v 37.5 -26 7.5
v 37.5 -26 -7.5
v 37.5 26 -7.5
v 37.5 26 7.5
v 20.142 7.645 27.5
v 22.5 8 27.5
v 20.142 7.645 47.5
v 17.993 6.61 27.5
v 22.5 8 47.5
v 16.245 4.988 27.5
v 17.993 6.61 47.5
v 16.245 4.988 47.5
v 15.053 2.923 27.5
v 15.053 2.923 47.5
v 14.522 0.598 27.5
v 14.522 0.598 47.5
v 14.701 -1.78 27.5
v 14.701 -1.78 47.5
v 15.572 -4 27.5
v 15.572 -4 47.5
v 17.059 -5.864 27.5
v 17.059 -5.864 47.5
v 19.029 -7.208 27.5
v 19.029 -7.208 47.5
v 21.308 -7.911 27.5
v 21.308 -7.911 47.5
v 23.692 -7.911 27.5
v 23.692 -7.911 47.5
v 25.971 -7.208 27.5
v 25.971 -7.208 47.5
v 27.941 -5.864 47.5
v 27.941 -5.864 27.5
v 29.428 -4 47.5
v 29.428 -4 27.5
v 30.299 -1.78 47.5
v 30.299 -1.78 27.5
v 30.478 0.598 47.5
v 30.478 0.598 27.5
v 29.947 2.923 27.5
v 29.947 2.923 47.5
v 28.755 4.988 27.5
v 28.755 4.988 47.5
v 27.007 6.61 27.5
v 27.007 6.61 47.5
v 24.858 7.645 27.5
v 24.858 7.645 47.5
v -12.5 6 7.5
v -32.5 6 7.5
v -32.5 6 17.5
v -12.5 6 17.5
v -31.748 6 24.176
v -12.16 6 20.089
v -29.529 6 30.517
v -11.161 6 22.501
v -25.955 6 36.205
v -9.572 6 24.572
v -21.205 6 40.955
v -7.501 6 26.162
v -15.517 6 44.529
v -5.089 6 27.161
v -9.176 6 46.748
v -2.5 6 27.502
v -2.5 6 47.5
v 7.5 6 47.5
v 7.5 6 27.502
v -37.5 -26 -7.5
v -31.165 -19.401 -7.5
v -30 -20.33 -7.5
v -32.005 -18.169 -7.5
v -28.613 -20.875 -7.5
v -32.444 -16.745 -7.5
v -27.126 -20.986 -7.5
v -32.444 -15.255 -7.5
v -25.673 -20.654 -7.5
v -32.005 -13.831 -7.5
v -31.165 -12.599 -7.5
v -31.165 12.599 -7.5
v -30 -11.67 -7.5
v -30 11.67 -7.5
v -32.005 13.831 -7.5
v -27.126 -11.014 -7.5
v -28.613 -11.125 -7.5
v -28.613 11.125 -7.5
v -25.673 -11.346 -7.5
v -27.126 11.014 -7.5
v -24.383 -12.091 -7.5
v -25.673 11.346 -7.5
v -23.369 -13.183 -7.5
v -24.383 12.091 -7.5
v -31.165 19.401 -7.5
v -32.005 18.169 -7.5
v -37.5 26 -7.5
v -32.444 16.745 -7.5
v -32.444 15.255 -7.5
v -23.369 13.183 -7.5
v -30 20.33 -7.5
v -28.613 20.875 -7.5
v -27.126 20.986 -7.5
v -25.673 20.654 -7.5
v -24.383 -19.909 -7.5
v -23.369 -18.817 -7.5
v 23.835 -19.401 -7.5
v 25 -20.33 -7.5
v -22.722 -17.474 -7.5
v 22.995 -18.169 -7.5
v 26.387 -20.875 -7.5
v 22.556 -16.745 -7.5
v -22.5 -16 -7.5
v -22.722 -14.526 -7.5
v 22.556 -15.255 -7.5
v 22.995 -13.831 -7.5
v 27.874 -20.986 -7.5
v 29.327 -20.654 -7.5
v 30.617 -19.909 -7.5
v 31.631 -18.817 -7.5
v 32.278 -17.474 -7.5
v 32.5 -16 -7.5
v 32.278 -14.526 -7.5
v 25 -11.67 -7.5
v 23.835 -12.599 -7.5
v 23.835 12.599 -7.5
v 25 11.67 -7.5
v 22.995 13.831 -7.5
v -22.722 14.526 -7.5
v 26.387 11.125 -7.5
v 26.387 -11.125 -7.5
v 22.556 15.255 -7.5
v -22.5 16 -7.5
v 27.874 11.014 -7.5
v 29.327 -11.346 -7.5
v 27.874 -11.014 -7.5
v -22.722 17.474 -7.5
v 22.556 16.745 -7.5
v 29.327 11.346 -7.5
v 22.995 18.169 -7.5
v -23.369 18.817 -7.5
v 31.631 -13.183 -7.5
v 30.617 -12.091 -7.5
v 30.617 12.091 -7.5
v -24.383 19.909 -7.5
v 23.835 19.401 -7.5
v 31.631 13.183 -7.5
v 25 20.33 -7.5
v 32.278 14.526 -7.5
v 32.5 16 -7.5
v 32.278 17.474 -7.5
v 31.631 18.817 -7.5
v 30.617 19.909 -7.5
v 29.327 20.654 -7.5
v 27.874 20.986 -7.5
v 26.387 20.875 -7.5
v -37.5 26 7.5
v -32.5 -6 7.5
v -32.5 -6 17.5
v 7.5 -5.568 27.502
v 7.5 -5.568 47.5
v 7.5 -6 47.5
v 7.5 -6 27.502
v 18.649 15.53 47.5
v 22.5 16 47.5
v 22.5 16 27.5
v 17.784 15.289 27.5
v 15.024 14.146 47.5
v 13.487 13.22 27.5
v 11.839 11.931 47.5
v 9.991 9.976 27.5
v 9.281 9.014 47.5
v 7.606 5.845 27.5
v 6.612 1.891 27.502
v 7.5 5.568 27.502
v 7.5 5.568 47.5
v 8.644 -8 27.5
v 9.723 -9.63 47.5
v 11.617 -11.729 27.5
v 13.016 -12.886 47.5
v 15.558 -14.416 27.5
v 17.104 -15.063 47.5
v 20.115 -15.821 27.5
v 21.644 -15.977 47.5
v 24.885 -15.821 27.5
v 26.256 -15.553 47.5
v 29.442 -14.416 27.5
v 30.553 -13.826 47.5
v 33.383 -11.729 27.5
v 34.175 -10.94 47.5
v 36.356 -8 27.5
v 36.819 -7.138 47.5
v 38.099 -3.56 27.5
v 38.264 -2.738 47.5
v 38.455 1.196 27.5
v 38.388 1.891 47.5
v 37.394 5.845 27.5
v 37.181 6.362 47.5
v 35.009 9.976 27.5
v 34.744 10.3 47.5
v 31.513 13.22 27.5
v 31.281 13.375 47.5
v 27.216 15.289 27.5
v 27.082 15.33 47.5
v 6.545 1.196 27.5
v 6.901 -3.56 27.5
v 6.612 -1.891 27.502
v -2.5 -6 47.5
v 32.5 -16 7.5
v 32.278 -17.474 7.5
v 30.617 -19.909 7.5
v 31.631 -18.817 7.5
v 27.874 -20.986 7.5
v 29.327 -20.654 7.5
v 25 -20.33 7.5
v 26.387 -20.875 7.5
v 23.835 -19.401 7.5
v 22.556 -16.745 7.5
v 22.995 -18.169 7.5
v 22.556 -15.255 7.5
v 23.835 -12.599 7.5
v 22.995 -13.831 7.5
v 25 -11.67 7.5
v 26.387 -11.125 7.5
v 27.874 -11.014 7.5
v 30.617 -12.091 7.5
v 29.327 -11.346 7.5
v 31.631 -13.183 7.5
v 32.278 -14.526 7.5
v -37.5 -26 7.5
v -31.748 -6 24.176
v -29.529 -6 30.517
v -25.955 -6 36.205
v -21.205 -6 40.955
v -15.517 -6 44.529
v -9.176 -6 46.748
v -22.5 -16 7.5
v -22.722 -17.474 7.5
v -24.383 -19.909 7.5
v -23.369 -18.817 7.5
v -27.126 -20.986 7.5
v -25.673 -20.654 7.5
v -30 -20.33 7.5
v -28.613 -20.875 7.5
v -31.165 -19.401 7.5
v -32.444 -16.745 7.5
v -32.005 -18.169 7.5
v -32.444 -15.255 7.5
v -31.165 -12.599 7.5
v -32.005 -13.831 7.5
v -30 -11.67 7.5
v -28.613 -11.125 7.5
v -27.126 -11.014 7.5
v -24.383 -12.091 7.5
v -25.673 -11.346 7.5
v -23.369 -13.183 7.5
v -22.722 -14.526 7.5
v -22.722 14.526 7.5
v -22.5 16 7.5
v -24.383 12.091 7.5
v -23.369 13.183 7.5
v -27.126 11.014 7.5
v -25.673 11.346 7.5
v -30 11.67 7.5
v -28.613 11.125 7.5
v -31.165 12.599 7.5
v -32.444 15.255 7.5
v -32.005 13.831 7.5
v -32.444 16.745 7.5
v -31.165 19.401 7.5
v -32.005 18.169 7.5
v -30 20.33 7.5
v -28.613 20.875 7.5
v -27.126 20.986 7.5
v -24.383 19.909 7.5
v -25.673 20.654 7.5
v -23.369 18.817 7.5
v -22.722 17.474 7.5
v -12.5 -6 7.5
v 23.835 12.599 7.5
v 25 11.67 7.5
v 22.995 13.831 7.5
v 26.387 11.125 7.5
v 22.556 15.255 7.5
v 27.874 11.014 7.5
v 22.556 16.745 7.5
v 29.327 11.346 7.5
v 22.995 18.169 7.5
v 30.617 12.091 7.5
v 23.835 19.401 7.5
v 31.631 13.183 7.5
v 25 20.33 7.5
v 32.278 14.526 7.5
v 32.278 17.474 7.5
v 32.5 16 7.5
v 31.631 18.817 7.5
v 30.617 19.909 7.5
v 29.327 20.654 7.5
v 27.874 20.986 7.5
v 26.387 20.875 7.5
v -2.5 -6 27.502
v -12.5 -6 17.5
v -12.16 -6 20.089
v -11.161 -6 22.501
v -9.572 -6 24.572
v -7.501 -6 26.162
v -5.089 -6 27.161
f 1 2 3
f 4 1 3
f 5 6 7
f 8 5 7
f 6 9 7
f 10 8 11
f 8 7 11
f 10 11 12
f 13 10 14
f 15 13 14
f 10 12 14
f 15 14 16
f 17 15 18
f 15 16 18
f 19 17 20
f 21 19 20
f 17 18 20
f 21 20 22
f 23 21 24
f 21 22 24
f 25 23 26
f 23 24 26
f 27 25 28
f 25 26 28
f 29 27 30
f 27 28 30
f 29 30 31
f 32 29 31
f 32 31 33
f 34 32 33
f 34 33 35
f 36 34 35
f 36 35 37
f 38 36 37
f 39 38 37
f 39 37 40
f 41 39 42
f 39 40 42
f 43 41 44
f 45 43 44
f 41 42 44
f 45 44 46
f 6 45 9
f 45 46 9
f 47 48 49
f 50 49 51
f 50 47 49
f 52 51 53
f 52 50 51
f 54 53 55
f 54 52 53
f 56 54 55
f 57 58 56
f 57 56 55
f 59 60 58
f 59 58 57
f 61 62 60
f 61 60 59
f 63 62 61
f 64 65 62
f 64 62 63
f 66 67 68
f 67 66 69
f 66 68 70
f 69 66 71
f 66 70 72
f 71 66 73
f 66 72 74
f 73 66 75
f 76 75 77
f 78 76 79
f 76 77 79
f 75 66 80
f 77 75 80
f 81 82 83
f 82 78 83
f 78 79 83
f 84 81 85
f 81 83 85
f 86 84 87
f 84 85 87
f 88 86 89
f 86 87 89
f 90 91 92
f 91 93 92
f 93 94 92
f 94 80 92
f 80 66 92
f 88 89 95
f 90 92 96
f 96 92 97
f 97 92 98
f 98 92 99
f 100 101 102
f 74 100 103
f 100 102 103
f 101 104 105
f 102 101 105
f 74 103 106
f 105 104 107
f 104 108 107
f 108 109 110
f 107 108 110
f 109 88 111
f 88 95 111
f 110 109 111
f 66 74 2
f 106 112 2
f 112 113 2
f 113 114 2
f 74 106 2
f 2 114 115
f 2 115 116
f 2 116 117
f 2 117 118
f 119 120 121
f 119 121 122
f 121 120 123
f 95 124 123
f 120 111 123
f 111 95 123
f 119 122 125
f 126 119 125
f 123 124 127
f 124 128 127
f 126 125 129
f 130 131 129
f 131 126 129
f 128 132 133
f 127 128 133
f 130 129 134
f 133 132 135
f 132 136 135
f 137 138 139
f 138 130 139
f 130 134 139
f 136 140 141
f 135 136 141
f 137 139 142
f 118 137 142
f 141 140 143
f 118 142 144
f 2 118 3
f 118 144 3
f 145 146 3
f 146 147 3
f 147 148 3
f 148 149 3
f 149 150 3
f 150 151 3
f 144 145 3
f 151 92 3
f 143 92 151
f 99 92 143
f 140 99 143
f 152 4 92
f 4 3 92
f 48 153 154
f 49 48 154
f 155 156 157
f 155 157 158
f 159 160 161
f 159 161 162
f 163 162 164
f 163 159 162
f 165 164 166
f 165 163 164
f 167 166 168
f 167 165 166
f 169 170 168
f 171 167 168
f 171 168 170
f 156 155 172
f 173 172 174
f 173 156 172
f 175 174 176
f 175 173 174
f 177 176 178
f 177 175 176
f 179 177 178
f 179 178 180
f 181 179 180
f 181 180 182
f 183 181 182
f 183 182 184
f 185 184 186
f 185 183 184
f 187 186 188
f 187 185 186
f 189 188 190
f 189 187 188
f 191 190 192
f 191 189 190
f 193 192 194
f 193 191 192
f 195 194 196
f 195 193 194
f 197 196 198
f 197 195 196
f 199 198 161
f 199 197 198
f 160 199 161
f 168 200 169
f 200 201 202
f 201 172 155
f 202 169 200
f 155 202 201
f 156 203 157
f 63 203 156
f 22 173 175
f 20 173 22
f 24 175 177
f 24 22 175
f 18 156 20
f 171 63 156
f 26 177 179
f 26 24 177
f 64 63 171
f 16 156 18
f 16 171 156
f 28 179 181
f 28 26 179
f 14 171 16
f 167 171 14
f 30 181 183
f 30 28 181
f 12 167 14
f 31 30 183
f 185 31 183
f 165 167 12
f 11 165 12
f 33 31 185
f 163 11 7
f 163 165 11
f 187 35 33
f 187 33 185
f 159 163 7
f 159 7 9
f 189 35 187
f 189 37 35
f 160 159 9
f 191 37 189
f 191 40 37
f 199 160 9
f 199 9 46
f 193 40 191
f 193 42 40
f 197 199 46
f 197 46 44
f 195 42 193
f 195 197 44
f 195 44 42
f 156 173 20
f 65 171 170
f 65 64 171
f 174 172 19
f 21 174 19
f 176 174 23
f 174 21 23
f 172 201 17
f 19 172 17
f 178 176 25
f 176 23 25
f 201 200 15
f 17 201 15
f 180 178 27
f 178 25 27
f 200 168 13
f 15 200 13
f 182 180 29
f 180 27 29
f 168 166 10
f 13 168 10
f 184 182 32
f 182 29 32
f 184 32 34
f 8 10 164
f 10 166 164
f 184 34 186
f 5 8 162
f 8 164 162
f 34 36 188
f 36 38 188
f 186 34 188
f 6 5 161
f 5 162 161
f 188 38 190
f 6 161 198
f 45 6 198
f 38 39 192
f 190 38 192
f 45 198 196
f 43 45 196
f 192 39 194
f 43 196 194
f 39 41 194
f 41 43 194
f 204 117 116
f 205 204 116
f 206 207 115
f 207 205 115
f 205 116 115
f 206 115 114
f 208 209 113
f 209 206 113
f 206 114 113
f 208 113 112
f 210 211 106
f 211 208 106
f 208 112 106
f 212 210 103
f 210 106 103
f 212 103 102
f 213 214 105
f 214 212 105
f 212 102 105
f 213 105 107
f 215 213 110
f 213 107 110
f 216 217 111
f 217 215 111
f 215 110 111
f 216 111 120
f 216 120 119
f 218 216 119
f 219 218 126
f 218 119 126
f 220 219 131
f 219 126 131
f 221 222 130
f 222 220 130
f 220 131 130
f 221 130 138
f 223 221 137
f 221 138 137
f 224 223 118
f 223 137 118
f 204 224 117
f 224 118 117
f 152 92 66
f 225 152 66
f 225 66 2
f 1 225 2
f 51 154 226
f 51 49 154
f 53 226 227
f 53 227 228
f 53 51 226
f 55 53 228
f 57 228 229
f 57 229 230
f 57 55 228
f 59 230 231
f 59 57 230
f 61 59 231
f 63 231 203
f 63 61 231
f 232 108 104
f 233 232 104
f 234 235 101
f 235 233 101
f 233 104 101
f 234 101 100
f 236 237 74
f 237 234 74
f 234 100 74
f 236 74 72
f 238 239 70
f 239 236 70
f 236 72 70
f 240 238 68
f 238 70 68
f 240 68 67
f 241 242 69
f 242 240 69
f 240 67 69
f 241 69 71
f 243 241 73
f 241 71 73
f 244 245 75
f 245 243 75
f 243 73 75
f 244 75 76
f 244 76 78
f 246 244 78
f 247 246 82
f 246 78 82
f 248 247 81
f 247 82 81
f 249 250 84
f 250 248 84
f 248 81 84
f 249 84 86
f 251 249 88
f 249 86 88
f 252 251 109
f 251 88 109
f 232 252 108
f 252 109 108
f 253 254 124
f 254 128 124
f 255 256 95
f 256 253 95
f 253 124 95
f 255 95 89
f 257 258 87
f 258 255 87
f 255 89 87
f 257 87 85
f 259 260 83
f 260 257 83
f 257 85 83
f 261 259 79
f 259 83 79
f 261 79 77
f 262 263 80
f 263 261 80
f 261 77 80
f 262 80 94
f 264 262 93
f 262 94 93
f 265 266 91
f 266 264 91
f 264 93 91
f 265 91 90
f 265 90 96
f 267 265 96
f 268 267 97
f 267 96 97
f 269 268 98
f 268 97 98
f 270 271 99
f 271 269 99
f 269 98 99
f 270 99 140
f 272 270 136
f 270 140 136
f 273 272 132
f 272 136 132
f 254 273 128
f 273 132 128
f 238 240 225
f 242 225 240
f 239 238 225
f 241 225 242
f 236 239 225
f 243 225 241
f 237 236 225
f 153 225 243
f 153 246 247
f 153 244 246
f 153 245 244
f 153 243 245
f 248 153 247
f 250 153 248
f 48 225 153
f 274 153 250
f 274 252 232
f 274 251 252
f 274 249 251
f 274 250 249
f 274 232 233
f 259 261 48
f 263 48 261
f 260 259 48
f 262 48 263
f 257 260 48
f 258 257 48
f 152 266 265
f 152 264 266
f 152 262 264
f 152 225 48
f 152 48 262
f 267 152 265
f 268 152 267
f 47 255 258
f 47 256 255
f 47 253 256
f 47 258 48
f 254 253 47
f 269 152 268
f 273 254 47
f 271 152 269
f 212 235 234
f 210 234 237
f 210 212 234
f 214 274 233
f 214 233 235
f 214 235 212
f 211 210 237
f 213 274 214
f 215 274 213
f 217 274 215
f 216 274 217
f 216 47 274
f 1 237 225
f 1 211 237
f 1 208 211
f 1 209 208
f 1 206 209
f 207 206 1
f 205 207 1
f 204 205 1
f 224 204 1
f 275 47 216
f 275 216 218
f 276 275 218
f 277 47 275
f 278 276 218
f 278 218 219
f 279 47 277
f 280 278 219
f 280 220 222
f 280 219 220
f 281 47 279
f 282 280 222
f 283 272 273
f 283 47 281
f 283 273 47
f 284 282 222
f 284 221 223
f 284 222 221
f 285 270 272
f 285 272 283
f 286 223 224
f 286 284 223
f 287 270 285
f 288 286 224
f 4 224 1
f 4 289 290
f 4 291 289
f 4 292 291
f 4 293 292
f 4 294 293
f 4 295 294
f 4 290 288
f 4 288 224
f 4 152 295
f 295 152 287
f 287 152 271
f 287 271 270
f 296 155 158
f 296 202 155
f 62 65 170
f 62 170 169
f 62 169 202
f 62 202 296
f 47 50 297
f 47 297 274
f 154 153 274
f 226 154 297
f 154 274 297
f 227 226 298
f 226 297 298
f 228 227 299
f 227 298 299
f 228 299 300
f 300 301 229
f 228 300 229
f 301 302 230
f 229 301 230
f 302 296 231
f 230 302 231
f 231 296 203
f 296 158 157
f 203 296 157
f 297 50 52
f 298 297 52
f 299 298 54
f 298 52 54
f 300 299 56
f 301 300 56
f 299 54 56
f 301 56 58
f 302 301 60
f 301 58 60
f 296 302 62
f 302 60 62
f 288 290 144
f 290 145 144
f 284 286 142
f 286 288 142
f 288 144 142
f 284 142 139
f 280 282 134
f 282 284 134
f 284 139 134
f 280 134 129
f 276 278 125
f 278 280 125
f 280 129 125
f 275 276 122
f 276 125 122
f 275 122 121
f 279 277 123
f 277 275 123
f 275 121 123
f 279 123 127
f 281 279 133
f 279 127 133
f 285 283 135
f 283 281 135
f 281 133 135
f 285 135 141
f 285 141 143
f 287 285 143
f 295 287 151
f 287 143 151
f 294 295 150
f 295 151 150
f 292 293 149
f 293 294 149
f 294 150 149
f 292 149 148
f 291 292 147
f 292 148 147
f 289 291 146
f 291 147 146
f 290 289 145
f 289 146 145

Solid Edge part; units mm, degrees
sketch "Sketch1" plane through (0, 0, 0) normal (0, 0, 1) x (1, 0, 0)
  line L0 (-37.5, -26) -> (37.5, -26)
  line L1 (37.5, -26) -> (37.5, 26)
  line L2 (37.5, 26) -> (-37.5, 26)
  line L3 (-37.5, 26) -> (-37.5, -26)
  circle A0 centre (-27.5, -16) radius 5
  circle A1 centre (-27.5, 16) radius 5
  circle A2 centre (27.5, 16) radius 5
  circle A3 centre (27.5, -16) radius 5
  dimension "D1" = 75
  dimension "D2" = 52
  dimension "D3" = 10
  dimension "D4" = 10
  dimension "D5" = 10
  dimension "D6" = 10
extrude "Protrusion1" add sketch "Sketch1" along normal mid plane 15
sketch "Sketch2" plane through (0, 0, 0) normal (0, -1, 0) x (1, 0, 0)
  arc A0 (-32.5, 17.5) -> (-2.5, 47.5) centre (-2.5, 17.5) cw
  line L0 (-2.5, 47.5) -> (7.5, 47.5)
  line L1 (7.5, 47.5) -> (7.5, 27.5021)
  line L2 (7.5, 27.5021) -> (-2.5, 27.5021)
  arc A1 (-12.5, 17.5) -> (-2.5, 27.5021) centre (-2.5, 17.5021) cw
  line L3 (-12.5, 17.5) -> (-12.5, 7.5)
  line L4 (-12.5, 7.5) -> (-32.5, 7.5)
  line L5 (-32.5, 7.5) -> (-32.5, 17.5)
extrude "ExtrudedProtrusion_2" add sketch "Sketch2" along normal mid plane 12
sketch "Sketch3" plane through (2.5, 0, 47.5) normal (0, 0, 1) x (0, 1, 0)
  circle A0 centre (0, -20) radius 16
  circle A1 centre (0, -20) radius 8
  dimension "D1" = 32
  dimension "D2" = 16
extrude "ExtrudedProtrusion_3" add sketch "Sketch3" against normal blind 20
